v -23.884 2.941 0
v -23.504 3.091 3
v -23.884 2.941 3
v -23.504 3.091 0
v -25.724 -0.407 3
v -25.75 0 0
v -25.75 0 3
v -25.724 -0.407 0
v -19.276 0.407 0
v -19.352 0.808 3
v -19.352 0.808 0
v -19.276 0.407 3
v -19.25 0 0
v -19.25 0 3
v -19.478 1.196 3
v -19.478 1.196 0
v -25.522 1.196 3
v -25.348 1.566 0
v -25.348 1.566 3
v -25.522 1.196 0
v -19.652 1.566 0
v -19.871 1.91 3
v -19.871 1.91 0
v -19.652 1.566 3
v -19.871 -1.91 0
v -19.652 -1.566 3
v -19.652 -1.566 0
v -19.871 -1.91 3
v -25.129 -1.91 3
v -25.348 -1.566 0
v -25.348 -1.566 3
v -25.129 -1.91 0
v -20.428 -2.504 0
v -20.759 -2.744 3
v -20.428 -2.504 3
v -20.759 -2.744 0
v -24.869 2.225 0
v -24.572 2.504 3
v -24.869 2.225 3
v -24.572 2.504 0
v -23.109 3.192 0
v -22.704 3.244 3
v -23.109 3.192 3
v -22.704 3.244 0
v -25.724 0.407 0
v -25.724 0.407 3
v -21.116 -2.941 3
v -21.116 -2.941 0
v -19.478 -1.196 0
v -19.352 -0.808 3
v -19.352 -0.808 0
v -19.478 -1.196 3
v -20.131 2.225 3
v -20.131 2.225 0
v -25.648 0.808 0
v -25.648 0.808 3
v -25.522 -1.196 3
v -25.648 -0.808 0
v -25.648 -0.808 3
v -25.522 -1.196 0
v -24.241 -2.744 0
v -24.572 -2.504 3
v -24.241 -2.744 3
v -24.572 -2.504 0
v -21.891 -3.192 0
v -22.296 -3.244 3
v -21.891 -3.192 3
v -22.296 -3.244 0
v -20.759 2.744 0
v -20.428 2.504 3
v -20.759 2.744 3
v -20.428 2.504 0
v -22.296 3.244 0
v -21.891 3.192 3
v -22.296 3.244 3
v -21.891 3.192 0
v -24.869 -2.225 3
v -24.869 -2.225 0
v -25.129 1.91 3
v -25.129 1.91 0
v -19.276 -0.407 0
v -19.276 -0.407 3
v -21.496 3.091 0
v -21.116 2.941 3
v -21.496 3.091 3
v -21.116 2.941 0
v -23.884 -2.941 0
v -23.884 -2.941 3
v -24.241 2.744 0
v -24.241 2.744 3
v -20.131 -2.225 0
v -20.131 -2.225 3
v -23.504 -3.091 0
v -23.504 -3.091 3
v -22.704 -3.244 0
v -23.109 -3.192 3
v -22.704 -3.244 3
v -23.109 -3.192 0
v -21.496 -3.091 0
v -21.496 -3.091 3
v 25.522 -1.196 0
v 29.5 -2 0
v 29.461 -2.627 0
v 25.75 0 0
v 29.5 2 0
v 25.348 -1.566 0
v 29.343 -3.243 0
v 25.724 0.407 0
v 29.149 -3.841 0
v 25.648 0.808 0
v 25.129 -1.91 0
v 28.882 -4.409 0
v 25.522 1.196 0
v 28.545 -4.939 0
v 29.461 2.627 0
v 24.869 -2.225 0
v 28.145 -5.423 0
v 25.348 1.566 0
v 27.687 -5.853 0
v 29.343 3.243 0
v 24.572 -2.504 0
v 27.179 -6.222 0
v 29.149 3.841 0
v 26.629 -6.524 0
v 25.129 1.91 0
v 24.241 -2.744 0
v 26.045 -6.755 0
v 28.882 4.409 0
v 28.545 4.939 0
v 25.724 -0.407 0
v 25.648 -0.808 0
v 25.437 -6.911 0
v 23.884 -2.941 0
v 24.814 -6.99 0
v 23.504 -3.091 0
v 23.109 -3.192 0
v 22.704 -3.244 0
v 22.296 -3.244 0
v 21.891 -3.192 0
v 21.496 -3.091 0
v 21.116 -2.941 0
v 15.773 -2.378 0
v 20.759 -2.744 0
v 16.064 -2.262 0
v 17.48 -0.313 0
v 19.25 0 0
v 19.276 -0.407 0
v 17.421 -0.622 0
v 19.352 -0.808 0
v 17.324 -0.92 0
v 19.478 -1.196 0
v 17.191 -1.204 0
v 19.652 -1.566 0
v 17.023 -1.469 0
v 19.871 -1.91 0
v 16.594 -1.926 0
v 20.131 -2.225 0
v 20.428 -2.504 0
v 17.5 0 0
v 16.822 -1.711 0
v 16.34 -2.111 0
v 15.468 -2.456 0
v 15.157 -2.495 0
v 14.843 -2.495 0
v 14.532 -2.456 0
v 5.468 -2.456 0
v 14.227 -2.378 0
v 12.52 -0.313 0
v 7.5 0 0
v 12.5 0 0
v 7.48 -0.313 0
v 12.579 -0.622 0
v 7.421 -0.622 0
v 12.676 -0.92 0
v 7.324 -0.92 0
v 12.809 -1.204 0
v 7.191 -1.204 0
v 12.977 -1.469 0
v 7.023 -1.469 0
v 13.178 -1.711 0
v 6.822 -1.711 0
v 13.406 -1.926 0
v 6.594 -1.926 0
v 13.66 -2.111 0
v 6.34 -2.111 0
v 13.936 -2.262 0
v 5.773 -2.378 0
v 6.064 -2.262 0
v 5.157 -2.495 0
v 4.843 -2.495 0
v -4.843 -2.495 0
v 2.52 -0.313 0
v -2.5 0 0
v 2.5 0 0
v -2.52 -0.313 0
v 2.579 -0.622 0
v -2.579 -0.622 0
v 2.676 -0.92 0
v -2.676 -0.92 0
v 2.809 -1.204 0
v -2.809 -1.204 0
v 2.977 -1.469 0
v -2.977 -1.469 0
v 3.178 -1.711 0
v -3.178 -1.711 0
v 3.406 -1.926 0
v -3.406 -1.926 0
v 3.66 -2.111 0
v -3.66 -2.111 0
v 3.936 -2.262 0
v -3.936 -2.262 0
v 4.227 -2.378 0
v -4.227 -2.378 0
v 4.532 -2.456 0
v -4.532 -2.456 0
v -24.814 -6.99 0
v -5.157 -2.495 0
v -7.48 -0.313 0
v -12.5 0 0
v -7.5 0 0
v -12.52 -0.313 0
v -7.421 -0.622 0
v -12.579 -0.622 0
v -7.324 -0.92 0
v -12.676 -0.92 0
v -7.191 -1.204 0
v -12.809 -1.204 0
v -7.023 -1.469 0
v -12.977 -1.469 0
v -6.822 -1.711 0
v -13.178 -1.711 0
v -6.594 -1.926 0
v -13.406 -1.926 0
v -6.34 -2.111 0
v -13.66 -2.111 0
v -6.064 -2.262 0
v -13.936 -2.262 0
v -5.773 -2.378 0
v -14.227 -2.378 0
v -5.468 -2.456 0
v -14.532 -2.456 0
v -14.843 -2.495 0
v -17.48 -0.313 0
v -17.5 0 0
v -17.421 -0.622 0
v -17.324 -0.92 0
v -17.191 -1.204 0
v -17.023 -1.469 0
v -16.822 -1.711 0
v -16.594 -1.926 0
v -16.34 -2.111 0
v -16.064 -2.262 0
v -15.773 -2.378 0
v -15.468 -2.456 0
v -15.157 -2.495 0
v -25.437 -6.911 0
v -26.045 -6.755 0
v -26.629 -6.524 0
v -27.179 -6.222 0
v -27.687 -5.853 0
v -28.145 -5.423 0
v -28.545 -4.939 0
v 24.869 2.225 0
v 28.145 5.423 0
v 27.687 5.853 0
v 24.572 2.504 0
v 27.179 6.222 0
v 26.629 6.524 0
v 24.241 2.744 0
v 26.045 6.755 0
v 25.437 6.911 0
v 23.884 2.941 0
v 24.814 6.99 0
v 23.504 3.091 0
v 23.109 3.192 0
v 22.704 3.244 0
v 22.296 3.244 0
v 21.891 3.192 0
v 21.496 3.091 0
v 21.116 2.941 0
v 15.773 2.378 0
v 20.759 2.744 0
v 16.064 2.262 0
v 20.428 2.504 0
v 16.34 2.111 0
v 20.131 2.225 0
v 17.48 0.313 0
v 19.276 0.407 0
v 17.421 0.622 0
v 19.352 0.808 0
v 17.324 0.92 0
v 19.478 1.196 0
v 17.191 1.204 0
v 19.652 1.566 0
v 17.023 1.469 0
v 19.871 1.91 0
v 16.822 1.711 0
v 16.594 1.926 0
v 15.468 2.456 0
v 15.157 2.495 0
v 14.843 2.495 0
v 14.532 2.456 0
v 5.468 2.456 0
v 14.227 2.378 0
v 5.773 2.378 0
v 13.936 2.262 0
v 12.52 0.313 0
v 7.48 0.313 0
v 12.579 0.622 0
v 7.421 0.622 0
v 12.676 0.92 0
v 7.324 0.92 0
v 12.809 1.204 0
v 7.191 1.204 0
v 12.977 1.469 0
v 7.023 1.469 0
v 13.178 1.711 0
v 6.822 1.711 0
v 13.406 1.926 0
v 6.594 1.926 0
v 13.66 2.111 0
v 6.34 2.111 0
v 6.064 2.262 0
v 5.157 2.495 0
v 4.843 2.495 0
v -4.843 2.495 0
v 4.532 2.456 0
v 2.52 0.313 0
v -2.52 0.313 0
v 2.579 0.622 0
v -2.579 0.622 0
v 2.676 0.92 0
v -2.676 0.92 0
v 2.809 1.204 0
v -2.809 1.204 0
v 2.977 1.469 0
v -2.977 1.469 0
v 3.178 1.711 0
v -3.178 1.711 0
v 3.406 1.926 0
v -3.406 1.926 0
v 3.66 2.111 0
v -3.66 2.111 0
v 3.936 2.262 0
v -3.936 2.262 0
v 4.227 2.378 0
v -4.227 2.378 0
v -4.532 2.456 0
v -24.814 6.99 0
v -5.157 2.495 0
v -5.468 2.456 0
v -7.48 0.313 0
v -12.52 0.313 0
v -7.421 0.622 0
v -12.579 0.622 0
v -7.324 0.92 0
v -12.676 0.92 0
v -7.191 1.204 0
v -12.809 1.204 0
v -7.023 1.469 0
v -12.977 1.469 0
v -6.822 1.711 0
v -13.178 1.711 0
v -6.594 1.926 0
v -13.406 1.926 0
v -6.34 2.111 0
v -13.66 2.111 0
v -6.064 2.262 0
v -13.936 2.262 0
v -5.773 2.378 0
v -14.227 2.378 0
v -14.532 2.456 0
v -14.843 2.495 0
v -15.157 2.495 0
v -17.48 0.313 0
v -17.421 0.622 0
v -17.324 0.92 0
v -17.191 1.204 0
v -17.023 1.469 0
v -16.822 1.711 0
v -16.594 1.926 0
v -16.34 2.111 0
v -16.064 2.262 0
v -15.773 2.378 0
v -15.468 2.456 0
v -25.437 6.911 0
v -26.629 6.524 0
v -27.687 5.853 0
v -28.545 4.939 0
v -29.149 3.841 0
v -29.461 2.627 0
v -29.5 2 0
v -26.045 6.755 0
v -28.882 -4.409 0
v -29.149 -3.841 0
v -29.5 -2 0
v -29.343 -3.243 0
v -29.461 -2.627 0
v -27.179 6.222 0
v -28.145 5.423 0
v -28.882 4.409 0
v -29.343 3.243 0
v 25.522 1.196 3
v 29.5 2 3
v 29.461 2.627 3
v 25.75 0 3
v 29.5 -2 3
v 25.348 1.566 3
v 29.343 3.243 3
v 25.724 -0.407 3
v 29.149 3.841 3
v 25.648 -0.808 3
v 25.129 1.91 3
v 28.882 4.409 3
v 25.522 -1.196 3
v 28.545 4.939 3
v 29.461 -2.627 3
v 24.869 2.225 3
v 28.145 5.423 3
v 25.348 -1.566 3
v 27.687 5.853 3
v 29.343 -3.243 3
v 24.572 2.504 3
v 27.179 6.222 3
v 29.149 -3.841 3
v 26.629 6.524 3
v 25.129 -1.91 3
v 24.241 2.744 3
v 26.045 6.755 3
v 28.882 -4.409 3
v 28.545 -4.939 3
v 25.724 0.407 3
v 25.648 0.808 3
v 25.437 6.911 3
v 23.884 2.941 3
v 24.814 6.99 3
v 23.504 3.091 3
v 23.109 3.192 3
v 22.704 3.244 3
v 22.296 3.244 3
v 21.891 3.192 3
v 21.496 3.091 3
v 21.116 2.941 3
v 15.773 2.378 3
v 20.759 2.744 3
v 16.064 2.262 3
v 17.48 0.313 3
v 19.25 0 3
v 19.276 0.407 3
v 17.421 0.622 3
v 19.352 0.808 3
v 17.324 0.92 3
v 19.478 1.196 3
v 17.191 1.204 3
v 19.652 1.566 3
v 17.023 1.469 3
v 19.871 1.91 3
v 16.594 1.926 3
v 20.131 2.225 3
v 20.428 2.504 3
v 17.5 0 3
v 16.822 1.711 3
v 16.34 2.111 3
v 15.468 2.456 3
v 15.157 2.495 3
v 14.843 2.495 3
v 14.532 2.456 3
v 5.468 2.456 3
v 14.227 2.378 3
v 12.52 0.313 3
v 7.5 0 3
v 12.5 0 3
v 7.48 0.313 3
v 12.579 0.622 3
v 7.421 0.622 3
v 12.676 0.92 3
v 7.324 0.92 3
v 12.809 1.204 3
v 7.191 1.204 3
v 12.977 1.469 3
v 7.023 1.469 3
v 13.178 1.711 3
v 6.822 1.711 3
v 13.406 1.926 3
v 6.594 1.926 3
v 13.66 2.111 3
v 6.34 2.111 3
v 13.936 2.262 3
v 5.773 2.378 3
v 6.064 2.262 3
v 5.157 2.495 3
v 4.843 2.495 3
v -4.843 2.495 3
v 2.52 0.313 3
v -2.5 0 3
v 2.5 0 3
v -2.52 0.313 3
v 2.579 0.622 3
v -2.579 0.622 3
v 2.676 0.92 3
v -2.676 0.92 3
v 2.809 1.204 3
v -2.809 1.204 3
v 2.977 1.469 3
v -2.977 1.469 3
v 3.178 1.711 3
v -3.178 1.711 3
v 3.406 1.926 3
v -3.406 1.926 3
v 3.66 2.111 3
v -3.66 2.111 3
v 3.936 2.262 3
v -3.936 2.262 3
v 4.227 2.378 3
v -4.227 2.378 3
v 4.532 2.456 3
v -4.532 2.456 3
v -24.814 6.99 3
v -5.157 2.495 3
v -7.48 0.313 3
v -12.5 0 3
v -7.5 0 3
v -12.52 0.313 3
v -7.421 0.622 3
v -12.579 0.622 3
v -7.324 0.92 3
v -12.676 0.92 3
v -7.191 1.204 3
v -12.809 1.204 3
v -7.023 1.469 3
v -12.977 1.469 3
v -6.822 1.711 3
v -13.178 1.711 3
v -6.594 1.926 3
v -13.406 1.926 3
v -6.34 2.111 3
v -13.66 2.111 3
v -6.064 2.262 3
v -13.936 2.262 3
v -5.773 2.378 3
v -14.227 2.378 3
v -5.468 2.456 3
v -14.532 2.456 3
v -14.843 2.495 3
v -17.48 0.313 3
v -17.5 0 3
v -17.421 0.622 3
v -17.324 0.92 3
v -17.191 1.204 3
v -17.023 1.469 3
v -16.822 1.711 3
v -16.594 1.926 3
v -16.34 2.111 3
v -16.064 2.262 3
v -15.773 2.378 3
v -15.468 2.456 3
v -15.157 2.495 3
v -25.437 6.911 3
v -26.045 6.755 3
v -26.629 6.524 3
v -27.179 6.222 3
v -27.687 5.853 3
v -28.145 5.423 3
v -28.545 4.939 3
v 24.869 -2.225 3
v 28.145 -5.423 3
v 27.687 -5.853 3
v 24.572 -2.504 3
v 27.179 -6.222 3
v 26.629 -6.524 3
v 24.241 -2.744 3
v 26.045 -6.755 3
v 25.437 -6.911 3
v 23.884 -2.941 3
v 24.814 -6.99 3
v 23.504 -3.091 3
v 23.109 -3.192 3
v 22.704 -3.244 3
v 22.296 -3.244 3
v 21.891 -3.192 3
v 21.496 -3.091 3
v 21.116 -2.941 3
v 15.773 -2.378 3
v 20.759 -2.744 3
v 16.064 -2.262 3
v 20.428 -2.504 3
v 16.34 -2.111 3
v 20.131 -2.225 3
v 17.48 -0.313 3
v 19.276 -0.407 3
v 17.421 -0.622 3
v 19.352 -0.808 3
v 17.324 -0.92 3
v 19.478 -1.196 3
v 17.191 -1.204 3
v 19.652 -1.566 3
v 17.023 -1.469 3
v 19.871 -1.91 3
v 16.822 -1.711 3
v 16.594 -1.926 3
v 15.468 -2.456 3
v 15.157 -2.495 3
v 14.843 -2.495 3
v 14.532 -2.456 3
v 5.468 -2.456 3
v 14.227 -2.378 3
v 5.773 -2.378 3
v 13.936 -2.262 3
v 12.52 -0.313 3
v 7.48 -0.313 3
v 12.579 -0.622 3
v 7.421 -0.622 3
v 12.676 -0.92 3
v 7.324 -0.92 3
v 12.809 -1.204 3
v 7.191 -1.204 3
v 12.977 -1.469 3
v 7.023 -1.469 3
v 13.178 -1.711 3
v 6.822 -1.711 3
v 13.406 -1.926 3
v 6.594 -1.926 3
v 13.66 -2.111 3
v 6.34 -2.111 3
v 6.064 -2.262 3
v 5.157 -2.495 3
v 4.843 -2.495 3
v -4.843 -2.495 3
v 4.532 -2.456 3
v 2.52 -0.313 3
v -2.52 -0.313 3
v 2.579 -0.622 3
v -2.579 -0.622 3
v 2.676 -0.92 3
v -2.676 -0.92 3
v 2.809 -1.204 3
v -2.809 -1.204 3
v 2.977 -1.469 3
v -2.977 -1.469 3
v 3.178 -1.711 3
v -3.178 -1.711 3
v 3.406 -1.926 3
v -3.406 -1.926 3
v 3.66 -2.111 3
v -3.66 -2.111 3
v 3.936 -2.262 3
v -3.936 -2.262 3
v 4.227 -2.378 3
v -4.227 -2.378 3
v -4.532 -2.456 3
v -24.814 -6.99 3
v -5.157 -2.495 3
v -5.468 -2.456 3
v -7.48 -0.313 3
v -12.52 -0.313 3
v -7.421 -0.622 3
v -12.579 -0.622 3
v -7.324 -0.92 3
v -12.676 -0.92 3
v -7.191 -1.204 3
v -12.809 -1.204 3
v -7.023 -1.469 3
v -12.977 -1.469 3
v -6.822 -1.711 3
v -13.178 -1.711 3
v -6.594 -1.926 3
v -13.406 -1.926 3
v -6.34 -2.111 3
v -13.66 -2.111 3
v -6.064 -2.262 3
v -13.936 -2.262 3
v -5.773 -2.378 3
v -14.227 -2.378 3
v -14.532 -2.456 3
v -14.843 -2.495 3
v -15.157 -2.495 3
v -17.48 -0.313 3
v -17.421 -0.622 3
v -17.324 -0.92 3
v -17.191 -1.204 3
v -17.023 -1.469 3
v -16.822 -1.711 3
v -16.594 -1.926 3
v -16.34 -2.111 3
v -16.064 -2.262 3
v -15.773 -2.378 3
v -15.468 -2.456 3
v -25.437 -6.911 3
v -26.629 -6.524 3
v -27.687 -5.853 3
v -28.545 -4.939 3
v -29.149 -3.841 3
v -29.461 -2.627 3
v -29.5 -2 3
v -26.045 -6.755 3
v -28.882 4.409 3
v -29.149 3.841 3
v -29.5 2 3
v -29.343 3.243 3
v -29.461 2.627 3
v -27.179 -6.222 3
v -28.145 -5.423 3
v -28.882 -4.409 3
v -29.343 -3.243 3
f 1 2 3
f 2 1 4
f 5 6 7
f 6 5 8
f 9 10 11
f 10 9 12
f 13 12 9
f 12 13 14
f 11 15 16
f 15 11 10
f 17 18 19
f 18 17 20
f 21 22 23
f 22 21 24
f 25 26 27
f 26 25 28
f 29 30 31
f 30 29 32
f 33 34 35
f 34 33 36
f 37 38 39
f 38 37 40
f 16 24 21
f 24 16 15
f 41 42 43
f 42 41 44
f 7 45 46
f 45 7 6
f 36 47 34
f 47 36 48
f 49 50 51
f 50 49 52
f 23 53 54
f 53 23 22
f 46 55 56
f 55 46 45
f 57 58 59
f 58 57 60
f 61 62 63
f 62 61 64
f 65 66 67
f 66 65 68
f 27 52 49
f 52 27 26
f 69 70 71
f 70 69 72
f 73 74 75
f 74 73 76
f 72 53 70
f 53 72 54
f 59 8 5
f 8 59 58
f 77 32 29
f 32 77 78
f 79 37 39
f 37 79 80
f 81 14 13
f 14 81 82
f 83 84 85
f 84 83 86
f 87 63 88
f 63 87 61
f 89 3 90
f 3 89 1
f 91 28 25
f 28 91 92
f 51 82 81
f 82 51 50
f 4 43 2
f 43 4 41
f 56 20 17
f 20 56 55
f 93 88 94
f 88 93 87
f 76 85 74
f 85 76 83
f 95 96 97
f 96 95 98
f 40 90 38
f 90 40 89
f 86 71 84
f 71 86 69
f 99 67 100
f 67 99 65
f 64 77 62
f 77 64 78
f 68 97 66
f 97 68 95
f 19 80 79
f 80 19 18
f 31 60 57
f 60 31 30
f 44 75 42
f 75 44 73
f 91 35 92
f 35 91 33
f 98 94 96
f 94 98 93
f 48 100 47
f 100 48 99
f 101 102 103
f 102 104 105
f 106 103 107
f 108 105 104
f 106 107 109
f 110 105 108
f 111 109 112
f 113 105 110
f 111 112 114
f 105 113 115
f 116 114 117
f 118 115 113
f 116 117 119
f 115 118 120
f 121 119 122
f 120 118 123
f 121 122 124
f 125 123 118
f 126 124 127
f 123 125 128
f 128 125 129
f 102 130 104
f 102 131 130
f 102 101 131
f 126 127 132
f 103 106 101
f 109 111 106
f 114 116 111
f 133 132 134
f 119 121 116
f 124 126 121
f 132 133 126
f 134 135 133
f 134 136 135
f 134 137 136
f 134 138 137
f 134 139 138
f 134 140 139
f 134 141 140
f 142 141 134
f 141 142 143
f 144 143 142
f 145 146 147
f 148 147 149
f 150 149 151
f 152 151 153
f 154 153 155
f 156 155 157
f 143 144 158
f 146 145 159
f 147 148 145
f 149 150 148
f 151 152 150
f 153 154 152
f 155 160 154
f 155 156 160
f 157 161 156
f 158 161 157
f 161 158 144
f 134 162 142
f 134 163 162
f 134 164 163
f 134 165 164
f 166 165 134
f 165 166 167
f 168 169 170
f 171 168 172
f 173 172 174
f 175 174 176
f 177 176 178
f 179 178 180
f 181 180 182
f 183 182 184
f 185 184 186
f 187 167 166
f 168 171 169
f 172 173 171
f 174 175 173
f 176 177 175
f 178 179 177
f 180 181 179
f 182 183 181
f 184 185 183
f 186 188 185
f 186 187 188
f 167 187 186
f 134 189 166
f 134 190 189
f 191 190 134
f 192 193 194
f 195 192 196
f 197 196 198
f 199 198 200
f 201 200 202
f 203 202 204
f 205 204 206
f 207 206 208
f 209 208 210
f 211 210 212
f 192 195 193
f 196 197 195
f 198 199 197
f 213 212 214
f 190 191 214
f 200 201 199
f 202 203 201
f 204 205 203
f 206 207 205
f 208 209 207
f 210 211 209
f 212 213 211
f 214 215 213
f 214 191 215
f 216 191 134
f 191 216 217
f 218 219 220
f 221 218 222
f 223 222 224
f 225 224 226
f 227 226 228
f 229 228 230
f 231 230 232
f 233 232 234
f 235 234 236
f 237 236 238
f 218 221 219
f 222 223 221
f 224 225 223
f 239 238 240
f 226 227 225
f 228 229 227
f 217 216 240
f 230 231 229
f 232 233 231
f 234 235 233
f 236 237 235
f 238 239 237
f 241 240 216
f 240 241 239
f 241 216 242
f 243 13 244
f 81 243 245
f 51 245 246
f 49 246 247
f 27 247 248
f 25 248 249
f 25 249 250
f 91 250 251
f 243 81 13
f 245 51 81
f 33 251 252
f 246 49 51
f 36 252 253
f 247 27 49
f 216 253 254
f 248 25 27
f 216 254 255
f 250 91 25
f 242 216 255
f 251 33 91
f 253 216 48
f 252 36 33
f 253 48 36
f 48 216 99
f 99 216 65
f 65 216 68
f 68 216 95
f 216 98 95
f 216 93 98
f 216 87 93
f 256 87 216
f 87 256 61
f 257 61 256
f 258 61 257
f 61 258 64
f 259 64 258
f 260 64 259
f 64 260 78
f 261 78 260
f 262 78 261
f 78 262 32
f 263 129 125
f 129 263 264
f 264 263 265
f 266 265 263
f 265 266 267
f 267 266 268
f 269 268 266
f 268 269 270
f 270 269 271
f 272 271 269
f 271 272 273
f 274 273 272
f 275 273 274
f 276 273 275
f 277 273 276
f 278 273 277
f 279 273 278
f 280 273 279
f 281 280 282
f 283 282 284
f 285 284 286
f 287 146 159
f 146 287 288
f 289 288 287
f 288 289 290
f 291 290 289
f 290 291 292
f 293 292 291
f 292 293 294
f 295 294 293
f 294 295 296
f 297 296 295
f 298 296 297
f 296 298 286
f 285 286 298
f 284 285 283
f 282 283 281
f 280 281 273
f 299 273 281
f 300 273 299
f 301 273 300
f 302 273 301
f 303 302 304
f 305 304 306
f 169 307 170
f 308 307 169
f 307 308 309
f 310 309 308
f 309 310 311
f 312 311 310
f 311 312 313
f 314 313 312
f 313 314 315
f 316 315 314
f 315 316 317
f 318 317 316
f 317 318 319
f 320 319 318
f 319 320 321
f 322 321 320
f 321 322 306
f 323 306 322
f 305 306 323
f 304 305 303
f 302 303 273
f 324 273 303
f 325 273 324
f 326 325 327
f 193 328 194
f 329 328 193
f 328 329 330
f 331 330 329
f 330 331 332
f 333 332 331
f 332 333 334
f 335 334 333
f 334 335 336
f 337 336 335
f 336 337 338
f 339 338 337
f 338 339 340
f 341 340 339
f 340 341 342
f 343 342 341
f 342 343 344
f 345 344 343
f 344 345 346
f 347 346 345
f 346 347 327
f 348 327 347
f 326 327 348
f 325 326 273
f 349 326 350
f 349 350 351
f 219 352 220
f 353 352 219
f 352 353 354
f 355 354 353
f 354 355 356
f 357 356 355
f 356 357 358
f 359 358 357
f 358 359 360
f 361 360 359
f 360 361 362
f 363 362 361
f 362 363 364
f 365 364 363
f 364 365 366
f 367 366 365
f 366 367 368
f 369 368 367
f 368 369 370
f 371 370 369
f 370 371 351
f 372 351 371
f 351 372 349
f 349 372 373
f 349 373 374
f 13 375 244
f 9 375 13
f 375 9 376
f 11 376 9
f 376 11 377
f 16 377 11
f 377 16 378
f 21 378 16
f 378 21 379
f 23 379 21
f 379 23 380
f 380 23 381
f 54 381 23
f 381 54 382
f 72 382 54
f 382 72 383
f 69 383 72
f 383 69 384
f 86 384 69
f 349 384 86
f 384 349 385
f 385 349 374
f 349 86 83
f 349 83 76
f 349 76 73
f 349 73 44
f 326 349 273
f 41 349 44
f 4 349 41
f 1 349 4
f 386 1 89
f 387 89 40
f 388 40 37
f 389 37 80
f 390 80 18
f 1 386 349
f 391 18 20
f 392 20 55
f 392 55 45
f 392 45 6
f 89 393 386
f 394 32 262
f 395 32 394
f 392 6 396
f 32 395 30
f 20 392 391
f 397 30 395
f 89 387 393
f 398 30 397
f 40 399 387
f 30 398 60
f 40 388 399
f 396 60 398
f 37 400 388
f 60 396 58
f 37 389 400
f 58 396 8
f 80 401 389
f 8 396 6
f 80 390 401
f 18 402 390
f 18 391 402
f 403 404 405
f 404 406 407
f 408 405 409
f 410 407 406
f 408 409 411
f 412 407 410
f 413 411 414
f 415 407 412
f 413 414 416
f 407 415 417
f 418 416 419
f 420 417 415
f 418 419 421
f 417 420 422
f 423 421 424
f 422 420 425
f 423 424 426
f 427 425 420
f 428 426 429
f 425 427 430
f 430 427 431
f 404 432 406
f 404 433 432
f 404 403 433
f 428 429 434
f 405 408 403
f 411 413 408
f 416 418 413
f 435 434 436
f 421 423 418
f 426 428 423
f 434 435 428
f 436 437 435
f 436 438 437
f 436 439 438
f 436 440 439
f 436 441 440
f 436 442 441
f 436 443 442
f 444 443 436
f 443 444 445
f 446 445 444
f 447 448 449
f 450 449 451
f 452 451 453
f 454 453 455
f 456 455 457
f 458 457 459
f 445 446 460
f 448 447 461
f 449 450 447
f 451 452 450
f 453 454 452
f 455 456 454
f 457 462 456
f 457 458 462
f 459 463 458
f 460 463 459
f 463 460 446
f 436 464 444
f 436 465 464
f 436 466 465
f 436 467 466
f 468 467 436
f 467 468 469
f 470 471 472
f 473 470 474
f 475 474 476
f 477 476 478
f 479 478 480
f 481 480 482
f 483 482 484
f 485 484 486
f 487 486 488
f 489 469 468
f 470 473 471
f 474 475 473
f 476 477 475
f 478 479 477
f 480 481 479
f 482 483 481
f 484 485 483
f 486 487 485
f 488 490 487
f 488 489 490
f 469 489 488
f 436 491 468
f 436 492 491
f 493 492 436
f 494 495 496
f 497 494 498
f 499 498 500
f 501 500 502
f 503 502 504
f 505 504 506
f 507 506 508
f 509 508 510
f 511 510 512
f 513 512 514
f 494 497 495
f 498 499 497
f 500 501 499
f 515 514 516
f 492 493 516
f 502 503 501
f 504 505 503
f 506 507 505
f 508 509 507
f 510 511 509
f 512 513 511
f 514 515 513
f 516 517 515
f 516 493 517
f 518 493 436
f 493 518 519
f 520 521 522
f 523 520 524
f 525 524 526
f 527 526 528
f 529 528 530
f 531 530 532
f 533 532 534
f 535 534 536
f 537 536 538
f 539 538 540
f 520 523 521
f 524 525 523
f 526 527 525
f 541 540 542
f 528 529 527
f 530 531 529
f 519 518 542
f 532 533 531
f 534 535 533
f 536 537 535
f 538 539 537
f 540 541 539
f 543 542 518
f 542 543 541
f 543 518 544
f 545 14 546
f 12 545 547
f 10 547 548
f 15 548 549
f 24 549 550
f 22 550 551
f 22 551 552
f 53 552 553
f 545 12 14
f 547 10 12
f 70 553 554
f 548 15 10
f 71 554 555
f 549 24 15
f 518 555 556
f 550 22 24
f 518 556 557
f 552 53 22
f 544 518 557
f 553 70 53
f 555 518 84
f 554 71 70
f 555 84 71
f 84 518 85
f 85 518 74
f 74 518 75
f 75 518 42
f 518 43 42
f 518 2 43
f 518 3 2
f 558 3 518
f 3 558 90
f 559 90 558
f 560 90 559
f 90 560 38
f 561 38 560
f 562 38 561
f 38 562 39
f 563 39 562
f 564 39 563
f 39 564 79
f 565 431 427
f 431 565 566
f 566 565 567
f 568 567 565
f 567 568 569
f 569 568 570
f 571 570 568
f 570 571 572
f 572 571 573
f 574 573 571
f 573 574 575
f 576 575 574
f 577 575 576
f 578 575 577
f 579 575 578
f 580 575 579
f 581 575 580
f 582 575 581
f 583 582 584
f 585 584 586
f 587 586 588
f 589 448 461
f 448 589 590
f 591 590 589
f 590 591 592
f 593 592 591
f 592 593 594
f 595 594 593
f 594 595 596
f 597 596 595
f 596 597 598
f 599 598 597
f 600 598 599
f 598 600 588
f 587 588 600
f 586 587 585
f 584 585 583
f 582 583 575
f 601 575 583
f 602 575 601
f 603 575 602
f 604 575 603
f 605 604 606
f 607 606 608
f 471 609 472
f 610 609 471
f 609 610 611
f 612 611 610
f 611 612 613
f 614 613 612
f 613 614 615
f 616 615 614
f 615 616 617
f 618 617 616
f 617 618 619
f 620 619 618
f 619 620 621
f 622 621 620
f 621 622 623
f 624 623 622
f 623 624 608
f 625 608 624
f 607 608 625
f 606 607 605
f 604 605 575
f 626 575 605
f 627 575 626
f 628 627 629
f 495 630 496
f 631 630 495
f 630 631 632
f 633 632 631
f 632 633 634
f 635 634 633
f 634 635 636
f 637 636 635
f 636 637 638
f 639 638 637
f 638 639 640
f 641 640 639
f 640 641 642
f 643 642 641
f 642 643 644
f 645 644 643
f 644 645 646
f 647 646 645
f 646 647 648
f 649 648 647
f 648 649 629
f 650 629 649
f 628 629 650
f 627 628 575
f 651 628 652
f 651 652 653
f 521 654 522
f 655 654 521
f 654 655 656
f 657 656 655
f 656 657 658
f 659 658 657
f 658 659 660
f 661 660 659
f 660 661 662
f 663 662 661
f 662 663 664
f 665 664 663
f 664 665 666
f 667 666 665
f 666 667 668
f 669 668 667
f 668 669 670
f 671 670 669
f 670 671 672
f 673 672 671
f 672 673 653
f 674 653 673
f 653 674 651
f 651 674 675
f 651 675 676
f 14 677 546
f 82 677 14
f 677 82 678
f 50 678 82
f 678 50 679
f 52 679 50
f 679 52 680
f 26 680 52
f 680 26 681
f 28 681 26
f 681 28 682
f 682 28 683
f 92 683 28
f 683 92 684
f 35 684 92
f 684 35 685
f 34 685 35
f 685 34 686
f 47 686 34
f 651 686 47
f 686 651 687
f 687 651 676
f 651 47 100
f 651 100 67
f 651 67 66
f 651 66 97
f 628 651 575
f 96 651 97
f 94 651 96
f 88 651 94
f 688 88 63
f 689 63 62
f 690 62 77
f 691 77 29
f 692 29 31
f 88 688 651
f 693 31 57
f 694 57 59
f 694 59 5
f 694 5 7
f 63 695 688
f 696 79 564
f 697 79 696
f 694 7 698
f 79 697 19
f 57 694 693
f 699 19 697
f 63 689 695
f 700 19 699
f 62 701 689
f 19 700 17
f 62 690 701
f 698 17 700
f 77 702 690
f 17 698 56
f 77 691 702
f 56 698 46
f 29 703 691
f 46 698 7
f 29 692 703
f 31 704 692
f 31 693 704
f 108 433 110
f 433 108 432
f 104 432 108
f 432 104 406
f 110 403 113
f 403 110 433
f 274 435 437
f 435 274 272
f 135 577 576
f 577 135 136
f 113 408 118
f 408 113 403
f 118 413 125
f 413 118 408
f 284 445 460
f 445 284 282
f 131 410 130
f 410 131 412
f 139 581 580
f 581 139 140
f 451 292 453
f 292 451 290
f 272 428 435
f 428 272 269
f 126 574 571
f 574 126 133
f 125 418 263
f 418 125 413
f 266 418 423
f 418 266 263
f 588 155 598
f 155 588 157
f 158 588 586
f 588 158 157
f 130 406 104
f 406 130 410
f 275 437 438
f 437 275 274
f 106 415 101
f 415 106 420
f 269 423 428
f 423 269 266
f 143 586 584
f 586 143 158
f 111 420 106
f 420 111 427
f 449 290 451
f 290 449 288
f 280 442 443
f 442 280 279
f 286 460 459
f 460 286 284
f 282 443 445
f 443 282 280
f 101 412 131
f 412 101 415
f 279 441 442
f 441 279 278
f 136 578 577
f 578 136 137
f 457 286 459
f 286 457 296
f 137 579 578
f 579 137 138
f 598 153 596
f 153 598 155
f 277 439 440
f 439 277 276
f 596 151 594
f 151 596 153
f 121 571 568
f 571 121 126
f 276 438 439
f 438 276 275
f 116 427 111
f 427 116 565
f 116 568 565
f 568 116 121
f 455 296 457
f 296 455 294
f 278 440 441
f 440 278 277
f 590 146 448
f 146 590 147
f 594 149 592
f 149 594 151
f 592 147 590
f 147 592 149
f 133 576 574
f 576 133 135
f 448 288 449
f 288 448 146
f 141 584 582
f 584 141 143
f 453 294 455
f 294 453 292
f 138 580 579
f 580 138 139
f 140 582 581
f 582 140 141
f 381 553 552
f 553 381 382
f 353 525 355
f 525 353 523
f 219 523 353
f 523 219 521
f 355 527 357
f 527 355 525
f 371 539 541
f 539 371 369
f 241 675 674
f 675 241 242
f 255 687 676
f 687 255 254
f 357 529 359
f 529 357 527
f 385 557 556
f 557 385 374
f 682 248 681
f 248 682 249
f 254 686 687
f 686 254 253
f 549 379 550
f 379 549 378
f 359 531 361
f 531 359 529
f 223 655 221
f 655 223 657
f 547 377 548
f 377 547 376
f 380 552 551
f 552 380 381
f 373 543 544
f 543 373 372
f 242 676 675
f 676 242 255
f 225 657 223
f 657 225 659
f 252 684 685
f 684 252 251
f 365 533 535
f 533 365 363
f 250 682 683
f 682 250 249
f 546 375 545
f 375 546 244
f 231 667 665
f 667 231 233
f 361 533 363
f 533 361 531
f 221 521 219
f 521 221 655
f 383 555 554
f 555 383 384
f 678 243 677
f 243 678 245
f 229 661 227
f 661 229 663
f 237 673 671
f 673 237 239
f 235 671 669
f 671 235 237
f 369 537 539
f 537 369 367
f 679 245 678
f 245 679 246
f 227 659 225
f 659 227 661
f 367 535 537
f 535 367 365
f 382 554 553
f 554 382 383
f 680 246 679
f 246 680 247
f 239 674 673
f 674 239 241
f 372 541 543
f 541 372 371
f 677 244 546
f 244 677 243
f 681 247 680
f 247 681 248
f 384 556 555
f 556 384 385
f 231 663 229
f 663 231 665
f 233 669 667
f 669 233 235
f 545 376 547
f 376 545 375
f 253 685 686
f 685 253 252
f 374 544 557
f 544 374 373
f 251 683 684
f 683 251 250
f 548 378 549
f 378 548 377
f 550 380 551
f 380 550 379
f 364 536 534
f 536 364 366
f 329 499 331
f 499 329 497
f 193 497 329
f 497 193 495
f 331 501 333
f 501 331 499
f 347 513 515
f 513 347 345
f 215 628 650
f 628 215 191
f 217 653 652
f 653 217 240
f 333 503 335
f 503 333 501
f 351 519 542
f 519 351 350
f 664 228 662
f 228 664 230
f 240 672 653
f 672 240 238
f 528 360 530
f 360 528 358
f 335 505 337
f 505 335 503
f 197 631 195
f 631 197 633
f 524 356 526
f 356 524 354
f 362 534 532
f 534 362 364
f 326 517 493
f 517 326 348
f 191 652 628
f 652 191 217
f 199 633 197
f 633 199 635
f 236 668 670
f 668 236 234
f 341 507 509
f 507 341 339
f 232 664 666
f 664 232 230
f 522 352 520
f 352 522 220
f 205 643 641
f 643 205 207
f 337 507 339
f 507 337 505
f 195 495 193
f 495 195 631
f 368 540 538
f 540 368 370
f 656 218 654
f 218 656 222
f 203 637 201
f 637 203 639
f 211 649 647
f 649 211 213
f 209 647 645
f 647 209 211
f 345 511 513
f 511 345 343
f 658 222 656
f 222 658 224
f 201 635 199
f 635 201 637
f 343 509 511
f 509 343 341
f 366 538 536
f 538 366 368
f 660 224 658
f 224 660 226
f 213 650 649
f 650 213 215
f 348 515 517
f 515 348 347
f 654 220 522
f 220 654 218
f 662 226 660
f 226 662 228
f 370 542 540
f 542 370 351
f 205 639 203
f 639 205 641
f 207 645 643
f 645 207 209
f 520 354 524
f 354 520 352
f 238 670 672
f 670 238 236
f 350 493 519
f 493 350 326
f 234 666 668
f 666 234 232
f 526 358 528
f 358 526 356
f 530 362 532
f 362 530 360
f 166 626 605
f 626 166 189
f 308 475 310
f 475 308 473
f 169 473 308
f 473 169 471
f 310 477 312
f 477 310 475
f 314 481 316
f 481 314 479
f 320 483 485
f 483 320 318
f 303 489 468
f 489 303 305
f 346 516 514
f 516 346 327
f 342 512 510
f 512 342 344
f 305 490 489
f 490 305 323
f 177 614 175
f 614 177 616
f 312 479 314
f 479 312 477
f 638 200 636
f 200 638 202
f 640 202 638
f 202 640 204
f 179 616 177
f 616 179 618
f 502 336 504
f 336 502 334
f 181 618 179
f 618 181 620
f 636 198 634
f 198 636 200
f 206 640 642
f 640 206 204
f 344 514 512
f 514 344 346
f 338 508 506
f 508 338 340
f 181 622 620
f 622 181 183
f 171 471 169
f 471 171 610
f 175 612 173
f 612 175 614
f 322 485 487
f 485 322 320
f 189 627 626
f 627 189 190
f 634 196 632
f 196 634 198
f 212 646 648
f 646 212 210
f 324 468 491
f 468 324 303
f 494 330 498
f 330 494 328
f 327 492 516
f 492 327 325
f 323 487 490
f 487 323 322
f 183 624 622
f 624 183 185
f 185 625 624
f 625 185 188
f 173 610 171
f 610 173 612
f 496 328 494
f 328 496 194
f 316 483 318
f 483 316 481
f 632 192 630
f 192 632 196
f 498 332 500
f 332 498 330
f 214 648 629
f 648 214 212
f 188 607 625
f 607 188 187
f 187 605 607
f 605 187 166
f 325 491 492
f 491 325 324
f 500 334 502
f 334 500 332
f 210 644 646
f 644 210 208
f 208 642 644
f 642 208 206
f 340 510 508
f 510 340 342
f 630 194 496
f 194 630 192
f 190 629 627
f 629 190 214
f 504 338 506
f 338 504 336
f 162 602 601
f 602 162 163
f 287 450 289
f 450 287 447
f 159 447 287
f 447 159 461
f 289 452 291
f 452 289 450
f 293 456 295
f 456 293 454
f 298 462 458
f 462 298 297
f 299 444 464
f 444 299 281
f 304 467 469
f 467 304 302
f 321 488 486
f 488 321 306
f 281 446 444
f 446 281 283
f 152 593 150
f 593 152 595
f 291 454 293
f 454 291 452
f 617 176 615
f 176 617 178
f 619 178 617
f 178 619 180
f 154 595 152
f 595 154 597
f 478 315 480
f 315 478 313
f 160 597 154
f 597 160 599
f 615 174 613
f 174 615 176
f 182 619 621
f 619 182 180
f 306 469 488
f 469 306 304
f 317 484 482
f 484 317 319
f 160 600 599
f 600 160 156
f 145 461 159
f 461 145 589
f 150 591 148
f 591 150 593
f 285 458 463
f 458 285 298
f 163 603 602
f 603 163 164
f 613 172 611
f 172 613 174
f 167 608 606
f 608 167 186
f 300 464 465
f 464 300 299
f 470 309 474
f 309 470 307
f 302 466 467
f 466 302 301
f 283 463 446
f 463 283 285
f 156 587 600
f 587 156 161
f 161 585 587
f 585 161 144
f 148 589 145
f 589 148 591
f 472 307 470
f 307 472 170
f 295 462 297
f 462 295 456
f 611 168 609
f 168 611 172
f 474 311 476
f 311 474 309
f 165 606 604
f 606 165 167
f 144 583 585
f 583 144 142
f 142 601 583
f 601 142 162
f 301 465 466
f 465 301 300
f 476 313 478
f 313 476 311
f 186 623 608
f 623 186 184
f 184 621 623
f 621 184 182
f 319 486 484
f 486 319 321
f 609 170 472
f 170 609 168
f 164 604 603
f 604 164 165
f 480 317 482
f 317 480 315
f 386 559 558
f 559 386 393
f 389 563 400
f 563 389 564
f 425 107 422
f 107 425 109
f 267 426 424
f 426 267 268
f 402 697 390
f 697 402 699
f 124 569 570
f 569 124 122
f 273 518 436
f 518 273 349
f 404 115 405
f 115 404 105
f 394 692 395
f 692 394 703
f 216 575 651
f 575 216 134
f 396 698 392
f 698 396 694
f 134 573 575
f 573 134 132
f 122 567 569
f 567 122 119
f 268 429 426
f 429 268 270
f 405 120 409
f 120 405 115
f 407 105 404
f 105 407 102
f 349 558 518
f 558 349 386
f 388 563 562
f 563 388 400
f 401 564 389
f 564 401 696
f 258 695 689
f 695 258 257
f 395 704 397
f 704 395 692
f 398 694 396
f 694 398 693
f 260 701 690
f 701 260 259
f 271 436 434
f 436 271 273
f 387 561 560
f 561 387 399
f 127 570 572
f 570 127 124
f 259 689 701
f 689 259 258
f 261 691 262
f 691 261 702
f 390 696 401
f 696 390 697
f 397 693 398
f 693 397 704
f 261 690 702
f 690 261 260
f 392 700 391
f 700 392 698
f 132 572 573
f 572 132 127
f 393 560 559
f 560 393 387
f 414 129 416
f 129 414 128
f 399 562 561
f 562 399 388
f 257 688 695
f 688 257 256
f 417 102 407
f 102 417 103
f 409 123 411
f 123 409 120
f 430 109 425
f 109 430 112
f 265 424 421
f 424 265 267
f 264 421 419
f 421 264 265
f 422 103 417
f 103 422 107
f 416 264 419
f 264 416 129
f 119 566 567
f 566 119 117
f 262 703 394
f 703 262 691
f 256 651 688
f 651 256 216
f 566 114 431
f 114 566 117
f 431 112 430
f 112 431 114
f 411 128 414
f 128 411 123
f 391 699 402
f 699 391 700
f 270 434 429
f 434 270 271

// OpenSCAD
$fn = 50;

difference() {
	union() {
		hull() {
			translate(v = [-24.5, 2.0, 0]) {
				cylinder(h = 3, r = 5);
			}
			translate(v = [24.5, 2.0, 0]) {
				cylinder(h = 3, r = 5);
			}
			translate(v = [-24.5, -2.0, 0]) {
				cylinder(h = 3, r = 5);
			}
			translate(v = [24.5, -2.0, 0]) {
				cylinder(h = 3, r = 5);
			}
		}
	}
	union() {
		translate(v = [-22.5, 0.0, 0]) {
			cylinder(h = 3, r = 3.25);
		}
		translate(v = [22.5, 0.0, 0]) {
			cylinder(h = 3, r = 3.25);
		}
		translate(v = [-15.0, 0, 0.0]) {
			cylinder(h = 3, r = 2.5);
		}
		translate(v = [-5.0, 0, 0.0]) {
			cylinder(h = 3, r = 2.5);
		}
		translate(v = [5.0, 0, 0.0]) {
			cylinder(h = 3, r = 2.5);
		}
		translate(v = [15.0, 0, 0.0]) {
			cylinder(h = 3, r = 2.5);
		}
	}
}
